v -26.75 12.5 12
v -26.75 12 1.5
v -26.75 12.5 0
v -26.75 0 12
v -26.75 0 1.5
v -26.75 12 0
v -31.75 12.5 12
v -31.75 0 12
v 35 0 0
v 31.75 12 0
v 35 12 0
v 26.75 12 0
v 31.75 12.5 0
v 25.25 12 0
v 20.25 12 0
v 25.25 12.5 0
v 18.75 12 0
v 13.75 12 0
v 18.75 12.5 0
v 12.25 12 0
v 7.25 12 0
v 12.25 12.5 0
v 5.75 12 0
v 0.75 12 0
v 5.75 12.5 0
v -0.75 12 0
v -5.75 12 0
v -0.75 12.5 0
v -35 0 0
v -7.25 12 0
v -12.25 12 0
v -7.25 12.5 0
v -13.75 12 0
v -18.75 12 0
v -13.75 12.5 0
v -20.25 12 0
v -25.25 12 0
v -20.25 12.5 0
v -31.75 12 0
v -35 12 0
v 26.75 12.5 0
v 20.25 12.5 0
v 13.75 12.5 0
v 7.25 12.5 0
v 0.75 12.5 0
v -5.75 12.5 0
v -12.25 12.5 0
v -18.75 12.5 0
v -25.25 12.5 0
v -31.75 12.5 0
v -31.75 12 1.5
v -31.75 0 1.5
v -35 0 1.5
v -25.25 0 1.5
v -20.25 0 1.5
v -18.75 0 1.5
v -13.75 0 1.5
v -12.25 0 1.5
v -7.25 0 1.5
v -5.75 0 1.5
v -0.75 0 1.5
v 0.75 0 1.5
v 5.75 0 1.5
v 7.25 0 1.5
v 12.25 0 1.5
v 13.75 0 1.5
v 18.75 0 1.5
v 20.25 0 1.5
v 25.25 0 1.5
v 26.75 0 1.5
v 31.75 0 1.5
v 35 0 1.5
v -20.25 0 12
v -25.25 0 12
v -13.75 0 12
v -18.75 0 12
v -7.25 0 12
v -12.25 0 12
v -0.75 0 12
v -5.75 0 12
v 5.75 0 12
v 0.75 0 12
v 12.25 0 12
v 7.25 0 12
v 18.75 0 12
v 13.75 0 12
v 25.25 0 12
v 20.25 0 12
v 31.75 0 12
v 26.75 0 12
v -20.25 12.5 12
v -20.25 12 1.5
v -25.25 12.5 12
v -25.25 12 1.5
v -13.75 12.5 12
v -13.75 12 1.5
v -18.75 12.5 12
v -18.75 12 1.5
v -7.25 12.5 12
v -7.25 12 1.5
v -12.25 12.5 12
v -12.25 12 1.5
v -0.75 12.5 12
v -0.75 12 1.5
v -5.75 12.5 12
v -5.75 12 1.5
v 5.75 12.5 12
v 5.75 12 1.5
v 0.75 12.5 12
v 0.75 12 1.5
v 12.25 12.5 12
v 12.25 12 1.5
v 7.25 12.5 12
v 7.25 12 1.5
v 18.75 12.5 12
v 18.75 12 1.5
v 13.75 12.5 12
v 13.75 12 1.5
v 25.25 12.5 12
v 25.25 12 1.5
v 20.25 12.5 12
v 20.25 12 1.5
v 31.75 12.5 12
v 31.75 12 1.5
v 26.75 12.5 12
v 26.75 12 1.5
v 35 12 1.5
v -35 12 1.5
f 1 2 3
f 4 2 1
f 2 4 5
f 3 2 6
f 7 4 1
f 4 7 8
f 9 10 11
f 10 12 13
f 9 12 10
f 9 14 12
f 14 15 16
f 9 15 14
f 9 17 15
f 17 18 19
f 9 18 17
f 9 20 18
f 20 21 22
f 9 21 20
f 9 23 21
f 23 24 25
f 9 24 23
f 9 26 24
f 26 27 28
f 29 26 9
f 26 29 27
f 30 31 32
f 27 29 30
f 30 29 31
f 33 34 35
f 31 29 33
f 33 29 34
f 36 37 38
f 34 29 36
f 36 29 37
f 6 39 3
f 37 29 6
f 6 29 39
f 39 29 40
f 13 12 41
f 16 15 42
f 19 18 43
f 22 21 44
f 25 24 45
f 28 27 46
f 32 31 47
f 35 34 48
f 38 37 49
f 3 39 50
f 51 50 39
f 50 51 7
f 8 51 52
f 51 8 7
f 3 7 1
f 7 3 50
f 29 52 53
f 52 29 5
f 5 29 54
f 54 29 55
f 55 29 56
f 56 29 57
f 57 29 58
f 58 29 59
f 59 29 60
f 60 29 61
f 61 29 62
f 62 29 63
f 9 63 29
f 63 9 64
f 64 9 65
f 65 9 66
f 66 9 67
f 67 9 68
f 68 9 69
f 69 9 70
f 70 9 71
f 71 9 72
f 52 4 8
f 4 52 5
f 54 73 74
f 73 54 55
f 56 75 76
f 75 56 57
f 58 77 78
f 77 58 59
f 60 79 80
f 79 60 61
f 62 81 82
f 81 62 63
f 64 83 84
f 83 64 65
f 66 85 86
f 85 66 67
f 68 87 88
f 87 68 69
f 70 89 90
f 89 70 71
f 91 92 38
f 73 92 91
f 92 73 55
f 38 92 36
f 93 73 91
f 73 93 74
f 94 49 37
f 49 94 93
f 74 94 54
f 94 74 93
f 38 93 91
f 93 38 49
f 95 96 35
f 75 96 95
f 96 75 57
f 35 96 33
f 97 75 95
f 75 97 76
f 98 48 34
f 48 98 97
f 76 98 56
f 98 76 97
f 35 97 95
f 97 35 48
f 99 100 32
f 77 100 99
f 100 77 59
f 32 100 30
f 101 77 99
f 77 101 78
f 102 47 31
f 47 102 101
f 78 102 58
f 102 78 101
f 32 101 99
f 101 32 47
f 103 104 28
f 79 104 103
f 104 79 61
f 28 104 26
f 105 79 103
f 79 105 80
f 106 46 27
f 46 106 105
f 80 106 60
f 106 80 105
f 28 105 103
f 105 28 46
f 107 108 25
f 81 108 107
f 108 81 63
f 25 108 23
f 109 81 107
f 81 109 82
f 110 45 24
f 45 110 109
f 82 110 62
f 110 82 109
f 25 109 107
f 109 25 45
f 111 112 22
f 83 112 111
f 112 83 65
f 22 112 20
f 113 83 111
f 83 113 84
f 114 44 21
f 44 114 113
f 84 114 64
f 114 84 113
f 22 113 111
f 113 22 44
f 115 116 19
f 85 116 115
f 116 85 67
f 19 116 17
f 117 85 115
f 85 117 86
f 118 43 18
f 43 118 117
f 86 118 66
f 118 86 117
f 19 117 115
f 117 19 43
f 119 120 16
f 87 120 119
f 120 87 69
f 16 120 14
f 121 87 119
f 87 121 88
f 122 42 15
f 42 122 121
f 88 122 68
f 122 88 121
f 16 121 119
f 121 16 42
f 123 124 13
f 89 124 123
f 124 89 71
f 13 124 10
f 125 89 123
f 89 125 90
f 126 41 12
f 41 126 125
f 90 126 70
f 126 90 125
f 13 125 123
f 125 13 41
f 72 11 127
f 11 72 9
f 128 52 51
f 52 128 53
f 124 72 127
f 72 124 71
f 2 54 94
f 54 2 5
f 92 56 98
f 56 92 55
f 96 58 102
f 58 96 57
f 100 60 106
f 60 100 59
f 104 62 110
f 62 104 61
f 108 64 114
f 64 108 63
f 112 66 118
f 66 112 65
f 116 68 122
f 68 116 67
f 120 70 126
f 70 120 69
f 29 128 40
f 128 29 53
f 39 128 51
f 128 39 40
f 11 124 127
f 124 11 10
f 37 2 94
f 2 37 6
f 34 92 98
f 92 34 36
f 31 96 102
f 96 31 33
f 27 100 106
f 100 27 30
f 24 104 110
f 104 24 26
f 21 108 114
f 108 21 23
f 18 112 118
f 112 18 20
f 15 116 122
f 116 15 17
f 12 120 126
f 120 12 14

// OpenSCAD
// 10-well agarose gel comb, printed lying flat
// Units: mm. Comb sits on the bed (z = 0), builds upward (+Z).

// ---------- Parameters ----------
plate_t      = 1.5;    // comb plate thickness (Z)
spine_len    = 70;     // spine (back bar) length (X)
spine_w      = 12;     // spine width (Y)

tooth_count  = 10;     // number of wells / teeth
tooth_w      = 5.0;    // tooth width (X)
tooth_l      = 12;     // tooth length into the gel (Y, -ve direction)
tooth_h      = 12;     // tooth height above plate (Z)

gap          = 1.5;    // centre-to-centre spacing between teeth (X)
eps          = 0.5;    // cutter overshoot past faces

$fn = 64;

// ---------- Derived ----------
pitch   = tooth_w + gap;               // centre-to-centre spacing
x_start = -(tooth_count - 1) * pitch / 2; // first tooth centre (row centred)

// ---------- Model ----------
union() {
    // Spine (back bar)
    translate([-spine_len / 2, 0, 0])
        cube([spine_len, spine_w, plate_t]);

    // Teeth hanging in -Y
    for (i = [0 : tooth_count - 1])
        translate([x_start + i * pitch - tooth_w / 2,
                   spine_w - tooth_l,
                   0])
            cube([tooth_w, tooth_l + eps, tooth_h]);
}
